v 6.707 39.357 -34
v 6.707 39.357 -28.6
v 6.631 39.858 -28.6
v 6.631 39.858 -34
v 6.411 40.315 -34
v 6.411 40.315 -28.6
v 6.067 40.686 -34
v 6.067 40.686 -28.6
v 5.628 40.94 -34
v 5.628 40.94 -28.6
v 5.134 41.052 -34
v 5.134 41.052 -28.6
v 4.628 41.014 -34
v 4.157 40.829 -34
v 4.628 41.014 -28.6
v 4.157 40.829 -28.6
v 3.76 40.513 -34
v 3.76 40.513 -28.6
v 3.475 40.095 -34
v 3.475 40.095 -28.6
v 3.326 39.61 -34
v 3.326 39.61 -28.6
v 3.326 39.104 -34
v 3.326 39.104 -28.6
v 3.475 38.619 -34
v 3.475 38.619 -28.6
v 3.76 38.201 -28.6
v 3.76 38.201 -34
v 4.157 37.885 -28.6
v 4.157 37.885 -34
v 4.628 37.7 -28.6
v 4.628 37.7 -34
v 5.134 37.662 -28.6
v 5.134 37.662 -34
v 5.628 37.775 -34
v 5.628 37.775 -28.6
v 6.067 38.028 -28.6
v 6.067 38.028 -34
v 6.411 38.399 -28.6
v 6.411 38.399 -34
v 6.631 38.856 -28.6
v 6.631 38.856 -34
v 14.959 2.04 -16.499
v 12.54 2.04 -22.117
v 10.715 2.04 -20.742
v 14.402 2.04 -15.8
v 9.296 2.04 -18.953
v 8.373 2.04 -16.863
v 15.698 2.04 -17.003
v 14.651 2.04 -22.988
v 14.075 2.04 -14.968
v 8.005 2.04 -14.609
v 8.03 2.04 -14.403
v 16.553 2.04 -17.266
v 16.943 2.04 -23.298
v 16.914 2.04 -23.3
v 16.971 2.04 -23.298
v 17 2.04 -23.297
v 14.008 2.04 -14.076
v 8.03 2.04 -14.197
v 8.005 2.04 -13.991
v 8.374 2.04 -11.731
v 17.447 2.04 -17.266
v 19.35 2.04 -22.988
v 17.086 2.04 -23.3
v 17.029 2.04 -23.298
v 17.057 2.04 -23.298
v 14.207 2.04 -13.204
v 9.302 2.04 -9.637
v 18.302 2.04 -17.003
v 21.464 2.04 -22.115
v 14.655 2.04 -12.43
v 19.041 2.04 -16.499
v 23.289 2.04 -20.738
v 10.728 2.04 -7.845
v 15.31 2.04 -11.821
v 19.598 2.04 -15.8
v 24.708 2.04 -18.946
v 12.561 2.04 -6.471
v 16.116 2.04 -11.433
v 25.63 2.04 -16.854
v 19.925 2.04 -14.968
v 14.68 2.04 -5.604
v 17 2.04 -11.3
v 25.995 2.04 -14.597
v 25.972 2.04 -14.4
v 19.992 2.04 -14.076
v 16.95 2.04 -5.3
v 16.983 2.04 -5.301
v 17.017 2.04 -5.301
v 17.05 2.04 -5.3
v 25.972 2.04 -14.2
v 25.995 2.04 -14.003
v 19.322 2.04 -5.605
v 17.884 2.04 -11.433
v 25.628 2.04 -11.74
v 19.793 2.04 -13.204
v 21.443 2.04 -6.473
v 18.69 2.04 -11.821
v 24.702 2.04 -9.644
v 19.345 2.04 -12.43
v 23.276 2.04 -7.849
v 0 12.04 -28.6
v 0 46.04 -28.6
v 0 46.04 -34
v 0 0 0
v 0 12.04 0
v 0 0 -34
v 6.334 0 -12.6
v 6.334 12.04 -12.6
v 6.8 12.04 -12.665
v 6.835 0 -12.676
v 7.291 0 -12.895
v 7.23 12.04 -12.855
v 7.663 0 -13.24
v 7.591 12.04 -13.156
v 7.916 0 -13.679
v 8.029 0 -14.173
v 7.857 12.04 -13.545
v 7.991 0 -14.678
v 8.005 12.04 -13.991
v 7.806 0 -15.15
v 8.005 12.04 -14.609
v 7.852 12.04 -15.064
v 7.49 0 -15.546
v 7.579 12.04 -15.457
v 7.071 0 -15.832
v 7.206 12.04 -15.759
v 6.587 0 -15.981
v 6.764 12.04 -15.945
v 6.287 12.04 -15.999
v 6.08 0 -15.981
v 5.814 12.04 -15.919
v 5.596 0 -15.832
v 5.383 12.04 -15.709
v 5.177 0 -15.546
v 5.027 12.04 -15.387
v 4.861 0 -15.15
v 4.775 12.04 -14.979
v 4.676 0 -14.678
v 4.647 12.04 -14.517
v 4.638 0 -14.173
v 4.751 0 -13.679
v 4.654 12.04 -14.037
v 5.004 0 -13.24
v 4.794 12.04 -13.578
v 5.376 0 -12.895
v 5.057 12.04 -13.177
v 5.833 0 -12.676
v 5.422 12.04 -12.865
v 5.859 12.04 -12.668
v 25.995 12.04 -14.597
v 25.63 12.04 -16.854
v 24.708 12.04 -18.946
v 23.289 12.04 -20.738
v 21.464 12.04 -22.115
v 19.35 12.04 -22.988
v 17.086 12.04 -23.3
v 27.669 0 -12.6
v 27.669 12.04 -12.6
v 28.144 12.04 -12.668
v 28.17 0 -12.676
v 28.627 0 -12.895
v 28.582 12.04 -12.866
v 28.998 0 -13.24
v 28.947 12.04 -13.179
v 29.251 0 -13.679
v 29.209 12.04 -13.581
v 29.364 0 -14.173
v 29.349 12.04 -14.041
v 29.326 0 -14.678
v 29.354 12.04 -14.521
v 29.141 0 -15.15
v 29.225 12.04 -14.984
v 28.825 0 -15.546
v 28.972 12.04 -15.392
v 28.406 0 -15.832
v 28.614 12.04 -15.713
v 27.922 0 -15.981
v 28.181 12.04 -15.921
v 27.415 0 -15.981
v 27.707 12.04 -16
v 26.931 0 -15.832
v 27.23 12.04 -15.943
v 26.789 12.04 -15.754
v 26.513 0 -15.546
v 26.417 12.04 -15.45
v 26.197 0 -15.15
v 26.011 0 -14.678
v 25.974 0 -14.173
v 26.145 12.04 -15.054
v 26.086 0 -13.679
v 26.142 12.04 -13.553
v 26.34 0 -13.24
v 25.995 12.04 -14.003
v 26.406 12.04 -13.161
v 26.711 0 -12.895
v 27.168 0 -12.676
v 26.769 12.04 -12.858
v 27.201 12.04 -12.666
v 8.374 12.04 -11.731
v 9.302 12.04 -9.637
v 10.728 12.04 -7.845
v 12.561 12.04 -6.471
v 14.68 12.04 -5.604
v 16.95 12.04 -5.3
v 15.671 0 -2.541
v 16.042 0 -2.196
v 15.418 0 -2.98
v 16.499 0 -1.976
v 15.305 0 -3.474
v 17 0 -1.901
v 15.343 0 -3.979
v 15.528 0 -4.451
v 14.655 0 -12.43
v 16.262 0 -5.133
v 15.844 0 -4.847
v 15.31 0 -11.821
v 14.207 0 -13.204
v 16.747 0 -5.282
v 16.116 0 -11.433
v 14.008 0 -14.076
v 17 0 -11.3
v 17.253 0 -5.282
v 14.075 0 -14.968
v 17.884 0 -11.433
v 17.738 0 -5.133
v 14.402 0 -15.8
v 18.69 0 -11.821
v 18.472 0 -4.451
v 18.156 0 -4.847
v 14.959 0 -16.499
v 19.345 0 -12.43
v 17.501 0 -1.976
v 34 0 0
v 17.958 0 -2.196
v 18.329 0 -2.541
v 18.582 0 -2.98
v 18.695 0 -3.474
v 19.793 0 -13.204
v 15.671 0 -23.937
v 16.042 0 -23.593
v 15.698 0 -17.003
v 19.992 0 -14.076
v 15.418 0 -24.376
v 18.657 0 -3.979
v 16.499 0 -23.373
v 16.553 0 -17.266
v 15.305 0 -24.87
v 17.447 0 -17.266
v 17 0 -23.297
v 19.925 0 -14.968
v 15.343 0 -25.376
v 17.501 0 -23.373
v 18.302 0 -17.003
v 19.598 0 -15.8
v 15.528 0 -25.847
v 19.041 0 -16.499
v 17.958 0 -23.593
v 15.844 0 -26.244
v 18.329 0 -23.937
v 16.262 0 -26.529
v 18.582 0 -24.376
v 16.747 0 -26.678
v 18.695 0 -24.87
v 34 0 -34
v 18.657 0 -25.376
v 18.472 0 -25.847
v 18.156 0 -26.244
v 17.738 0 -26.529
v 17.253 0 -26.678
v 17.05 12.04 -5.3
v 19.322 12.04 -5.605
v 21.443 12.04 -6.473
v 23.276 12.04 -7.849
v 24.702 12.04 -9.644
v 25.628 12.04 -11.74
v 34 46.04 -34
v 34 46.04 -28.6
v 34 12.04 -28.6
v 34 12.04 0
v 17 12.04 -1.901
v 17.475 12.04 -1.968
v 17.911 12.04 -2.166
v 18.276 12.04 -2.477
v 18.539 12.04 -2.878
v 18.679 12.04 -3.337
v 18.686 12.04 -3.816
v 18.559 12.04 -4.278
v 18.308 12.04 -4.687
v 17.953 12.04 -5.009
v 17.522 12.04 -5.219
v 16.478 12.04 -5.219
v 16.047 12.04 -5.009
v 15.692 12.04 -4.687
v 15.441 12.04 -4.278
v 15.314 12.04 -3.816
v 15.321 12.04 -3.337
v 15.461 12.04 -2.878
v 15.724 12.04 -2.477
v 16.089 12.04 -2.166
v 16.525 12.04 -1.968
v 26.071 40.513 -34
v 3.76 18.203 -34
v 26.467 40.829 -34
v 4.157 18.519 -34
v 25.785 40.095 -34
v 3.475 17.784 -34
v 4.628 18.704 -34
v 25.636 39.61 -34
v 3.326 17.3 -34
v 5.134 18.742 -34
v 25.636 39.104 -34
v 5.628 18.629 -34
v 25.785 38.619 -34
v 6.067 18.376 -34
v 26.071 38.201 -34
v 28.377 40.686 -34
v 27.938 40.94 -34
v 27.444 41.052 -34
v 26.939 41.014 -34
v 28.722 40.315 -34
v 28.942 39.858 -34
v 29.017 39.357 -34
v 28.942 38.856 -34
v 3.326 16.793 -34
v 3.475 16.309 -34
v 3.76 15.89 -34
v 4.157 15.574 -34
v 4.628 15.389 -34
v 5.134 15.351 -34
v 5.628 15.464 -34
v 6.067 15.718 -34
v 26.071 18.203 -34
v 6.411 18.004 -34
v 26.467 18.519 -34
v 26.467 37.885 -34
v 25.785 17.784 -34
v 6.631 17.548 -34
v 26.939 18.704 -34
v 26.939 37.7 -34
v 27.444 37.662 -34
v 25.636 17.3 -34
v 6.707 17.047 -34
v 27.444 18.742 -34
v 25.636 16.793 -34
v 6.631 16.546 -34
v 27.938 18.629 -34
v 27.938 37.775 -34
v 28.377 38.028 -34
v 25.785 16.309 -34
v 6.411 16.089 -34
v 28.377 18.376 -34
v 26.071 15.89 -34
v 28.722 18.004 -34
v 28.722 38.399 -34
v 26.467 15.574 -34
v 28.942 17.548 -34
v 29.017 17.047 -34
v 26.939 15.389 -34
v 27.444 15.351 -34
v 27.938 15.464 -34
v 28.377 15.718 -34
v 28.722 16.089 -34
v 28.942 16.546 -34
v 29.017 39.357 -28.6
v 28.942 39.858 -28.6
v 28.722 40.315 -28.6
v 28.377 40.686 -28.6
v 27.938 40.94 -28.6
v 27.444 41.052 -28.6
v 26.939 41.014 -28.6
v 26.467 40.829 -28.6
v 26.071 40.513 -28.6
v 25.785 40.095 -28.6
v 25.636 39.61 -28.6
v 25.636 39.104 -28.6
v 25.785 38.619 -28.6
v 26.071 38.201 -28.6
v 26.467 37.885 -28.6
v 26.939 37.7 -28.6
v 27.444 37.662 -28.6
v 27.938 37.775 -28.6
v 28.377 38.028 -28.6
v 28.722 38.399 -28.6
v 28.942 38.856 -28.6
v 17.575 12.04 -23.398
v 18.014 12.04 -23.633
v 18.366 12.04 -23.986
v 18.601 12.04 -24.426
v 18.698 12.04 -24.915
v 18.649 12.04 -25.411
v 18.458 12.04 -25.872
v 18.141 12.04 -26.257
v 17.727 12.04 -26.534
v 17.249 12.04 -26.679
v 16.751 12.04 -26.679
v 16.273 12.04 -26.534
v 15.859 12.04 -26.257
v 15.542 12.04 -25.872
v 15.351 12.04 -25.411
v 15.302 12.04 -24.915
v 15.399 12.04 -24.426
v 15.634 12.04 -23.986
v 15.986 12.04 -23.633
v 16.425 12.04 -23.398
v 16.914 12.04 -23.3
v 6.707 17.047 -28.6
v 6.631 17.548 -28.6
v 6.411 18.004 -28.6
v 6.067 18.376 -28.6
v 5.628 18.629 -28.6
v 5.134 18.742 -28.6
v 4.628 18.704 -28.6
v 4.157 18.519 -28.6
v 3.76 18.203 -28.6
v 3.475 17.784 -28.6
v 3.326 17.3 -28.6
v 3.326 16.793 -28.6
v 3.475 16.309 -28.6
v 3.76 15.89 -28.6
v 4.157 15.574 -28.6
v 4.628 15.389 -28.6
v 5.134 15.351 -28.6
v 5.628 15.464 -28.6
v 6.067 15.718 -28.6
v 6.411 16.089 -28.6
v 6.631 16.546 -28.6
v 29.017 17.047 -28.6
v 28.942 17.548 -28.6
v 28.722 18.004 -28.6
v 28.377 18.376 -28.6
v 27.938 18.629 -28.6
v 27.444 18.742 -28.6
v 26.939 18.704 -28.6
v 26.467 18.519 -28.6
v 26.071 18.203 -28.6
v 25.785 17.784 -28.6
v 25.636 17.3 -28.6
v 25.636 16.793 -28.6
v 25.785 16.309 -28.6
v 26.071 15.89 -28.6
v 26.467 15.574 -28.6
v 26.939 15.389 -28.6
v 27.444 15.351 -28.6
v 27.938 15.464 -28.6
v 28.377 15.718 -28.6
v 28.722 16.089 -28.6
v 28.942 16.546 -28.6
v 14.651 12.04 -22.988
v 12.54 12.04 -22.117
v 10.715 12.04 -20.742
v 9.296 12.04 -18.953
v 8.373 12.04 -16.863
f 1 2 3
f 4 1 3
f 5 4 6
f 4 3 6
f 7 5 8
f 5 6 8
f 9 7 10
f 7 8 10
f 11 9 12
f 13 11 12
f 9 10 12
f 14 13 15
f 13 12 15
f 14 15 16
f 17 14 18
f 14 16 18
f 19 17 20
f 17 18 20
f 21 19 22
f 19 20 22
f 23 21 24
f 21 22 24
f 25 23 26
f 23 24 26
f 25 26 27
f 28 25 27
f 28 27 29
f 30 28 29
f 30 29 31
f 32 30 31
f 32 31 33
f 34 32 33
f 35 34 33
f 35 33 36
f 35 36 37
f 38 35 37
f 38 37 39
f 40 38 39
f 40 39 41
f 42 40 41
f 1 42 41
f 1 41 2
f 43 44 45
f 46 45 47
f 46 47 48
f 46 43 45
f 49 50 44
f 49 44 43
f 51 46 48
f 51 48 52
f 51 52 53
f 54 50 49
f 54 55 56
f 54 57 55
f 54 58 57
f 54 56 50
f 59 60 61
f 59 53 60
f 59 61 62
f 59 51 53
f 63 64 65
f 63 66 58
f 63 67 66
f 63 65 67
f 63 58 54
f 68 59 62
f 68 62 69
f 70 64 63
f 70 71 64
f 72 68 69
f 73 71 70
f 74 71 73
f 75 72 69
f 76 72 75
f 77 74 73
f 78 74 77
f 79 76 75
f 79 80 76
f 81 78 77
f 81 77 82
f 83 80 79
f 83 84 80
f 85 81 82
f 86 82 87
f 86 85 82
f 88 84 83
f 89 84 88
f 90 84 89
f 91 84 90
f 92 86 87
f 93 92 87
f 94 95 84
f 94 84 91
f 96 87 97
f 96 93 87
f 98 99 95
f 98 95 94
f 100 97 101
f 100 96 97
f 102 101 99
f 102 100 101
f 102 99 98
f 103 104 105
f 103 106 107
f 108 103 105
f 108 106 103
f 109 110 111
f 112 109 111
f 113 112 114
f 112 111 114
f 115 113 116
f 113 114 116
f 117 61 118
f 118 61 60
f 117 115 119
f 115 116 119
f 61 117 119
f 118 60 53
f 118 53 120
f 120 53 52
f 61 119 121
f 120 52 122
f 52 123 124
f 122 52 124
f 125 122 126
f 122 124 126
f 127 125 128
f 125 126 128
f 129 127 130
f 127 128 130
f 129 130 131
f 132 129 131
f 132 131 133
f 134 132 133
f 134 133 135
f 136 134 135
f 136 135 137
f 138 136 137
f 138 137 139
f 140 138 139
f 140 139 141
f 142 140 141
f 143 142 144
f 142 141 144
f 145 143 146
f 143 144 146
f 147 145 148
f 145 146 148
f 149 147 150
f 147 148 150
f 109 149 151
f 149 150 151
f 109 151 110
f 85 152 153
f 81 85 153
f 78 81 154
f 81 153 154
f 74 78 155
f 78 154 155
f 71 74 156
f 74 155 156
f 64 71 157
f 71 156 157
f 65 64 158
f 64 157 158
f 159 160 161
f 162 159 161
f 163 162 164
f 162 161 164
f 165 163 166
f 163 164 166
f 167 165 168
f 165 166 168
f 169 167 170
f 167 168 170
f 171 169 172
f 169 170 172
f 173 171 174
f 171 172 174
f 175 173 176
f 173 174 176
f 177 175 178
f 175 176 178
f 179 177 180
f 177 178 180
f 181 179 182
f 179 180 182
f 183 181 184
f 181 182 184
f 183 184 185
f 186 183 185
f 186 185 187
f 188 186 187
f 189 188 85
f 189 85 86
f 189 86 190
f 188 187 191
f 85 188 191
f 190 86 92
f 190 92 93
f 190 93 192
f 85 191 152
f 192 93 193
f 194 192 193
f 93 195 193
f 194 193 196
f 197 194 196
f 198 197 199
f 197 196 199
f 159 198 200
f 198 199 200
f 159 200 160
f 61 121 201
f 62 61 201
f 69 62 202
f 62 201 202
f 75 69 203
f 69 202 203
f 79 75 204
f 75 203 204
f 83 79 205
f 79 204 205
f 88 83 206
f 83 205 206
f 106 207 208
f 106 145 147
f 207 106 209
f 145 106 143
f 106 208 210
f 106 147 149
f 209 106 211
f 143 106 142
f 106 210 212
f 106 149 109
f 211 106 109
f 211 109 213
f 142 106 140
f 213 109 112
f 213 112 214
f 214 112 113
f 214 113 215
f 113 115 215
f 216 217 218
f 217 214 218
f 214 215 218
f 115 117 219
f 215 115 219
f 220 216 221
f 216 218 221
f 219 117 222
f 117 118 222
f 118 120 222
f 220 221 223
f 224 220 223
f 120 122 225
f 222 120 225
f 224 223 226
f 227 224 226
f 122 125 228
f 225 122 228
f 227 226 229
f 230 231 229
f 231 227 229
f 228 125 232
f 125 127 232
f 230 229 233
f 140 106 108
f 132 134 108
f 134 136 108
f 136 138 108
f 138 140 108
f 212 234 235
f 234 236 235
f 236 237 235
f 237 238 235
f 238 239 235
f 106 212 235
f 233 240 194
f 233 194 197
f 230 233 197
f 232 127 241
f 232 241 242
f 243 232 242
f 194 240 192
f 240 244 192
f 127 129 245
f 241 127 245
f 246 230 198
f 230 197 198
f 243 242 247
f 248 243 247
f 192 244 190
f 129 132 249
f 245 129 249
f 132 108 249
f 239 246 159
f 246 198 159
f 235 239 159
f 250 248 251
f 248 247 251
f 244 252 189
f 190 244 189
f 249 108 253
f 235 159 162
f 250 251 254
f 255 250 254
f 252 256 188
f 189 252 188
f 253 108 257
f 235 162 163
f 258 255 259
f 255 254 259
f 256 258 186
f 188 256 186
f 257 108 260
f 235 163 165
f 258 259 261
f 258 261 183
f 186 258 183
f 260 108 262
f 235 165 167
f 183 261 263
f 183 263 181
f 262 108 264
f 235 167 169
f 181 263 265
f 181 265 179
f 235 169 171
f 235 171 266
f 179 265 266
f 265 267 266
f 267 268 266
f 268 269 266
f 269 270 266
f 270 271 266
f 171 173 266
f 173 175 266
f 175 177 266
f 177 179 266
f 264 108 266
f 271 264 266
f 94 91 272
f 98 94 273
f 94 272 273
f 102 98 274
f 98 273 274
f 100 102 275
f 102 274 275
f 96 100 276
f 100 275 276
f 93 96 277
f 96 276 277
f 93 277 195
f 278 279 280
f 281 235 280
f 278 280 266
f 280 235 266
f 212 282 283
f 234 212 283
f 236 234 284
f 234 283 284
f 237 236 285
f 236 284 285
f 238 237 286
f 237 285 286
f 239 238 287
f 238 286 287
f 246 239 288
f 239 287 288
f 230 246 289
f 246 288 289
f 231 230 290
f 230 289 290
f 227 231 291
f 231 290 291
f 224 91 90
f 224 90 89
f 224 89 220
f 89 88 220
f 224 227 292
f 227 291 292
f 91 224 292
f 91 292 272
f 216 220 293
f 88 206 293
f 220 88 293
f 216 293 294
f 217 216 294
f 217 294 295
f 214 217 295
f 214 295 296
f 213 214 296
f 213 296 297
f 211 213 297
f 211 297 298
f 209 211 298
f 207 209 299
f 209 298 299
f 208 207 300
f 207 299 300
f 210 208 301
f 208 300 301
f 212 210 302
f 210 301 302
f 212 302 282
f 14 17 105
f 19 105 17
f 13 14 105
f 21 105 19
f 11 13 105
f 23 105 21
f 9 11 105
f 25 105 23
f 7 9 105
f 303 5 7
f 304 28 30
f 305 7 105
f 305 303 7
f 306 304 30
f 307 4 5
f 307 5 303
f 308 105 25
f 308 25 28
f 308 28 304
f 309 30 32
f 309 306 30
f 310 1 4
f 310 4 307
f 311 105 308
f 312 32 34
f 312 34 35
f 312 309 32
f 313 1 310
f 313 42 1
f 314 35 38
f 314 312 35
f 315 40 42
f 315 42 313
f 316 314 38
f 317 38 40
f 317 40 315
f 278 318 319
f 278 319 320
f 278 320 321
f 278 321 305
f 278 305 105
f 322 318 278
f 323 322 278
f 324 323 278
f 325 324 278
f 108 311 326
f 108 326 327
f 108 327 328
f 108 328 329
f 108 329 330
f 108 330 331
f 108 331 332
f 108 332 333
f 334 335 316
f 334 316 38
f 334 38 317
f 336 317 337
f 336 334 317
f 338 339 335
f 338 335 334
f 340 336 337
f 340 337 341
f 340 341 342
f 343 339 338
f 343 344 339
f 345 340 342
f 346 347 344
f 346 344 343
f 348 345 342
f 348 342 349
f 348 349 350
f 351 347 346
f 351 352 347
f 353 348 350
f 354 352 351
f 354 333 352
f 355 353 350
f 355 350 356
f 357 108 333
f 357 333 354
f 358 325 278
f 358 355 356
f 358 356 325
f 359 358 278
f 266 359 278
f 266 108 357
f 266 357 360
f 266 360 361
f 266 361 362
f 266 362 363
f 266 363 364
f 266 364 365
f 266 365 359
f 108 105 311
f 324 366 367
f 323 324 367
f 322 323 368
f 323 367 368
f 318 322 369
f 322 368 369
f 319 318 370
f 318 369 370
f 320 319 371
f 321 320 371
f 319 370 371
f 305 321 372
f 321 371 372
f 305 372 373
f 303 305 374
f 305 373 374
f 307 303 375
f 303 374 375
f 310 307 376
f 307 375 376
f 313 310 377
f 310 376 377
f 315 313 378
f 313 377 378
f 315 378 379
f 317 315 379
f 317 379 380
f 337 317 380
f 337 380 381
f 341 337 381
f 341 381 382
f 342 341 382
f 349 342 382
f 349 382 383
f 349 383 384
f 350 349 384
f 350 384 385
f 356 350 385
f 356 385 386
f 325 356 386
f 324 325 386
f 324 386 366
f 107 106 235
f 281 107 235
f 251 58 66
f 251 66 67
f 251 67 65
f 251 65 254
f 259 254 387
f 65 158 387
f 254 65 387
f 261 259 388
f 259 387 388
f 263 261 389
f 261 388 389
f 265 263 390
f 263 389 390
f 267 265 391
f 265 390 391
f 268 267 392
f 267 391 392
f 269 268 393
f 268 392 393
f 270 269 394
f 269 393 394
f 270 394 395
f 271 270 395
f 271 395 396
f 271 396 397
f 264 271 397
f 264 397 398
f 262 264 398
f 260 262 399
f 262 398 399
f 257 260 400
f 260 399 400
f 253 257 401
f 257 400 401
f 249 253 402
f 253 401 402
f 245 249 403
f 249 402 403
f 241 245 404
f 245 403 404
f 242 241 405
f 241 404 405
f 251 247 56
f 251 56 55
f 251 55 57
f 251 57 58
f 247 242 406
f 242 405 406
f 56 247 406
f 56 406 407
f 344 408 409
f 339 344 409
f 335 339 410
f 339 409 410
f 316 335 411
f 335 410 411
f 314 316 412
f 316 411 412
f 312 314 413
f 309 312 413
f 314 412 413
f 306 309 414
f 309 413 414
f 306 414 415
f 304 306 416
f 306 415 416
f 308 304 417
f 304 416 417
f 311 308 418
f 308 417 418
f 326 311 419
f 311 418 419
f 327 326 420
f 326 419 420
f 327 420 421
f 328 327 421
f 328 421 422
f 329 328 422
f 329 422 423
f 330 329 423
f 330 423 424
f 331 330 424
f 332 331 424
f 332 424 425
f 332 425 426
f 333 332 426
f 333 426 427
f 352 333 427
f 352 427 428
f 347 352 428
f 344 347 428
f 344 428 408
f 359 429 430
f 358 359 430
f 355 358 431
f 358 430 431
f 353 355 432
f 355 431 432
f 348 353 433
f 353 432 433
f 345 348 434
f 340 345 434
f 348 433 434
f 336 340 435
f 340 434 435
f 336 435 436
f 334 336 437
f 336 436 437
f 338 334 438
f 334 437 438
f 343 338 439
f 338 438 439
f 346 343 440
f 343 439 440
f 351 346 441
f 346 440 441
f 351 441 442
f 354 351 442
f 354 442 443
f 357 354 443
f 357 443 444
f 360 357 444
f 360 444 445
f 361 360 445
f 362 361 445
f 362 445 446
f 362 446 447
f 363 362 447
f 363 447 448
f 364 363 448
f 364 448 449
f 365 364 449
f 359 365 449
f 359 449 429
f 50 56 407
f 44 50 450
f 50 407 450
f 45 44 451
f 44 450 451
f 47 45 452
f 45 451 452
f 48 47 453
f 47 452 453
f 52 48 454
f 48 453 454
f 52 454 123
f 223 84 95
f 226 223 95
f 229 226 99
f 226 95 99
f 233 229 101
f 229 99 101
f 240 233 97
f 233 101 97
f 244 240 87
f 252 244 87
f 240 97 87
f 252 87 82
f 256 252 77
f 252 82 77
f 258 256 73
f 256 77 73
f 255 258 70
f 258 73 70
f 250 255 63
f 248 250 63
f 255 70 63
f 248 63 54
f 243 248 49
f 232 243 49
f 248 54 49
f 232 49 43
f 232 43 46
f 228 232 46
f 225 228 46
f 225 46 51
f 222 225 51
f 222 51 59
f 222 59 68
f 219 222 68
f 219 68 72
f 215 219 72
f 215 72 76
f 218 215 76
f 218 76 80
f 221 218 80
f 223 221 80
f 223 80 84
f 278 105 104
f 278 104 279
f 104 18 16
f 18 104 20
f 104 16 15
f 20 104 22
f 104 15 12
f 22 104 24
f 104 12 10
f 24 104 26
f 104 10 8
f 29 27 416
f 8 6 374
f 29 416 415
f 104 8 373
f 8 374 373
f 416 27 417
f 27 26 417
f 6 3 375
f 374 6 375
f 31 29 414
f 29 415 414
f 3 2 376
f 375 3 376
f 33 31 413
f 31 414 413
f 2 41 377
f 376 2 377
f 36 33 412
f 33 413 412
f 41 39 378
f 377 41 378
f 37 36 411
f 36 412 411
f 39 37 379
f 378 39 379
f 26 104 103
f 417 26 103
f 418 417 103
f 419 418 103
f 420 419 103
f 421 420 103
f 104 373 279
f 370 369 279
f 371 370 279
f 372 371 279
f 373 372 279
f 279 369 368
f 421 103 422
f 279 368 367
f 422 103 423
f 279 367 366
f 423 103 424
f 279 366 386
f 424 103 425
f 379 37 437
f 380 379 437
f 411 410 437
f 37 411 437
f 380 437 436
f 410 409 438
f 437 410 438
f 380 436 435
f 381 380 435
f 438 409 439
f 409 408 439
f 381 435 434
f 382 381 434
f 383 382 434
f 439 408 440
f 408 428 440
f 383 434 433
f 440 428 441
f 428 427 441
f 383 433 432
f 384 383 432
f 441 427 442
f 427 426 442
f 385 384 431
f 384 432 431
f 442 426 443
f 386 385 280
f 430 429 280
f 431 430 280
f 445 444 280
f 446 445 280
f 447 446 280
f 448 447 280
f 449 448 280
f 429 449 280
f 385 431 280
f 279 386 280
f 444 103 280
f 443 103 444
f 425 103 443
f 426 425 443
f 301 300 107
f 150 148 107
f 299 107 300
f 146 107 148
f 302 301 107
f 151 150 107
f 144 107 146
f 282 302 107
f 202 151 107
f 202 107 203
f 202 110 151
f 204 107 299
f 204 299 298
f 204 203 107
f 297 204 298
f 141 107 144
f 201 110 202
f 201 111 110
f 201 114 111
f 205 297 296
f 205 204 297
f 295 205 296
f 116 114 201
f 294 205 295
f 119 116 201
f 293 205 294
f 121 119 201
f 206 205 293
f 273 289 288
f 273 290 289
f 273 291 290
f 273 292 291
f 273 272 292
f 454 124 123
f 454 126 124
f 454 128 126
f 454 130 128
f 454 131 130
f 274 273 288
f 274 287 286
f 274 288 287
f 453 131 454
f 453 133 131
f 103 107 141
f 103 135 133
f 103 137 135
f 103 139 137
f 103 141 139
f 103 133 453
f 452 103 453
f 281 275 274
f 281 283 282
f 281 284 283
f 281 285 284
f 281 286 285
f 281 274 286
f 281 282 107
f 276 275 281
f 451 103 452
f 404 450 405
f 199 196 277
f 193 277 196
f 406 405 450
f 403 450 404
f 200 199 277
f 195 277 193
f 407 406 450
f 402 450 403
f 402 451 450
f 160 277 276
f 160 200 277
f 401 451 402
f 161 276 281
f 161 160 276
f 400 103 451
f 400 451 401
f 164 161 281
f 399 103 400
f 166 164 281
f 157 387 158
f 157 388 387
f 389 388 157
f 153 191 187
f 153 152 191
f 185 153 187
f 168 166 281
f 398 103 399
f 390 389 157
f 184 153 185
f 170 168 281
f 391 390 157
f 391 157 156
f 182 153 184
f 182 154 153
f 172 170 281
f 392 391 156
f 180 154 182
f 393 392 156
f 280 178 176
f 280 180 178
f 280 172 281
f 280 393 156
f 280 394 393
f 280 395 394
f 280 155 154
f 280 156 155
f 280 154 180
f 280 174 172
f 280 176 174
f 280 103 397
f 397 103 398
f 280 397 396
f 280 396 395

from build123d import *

# Parameters (mm, degrees)
SKETCH1_W           = 34
SKETCH1_H           = 34
BOSS_EXTRUDE1_DEPTH = 12.04
SKETCH2_W           = 34
SKETCH2_H           = 5.4
BOSS_EXTRUDE2_DEPTH = 34
SKETCH3_R           = 9
CUT_EXTRUDE1_DEPTH  = 10
SKETCH4_R           = 1.7
SKETCH4_R_2         = 1.700000029
CUT_EXTRUDE2_DEPTH  = 59.889727457
SKETCH6_R           = 3
CUT_EXTRUDE3_DEPTH  = 66.176682947
SKETCH7_R           = 1.7
CUT_EXTRUDE4_DEPTH  = 64.981572347


with BuildPart() as part:
    # Sketch1 → Boss-Extrude1 (new body)
    with BuildSketch(Plane(origin=(0, 0, 0), x_dir=(1, 0, 0), z_dir=(0, 1, 0))):
        with Locations((17, 17)):
            Rectangle(SKETCH1_W, SKETCH1_H)
    extrude(amount=BOSS_EXTRUDE1_DEPTH)

    # Sketch2 → Boss-Extrude2 (add)
    with BuildSketch(Plane(origin=(0, 12.04, 0), x_dir=(1, 0, 0), z_dir=(0, 1, 0))):
        with Locations((17, 31.3)):
            Rectangle(SKETCH2_W, SKETCH2_H)
    extrude(amount=BOSS_EXTRUDE2_DEPTH)

    # Sketch3 → Cut-Extrude1 (cut)
    with BuildSketch(Plane(origin=(0, 12.04, 0), x_dir=(1, 0, 0), z_dir=(0, 1, 0))):
        with Locations(Location((17, 14.3, 0), (0, 0, 270))):
            Circle(SKETCH3_R)
    extrude(amount=-CUT_EXTRUDE1_DEPTH, mode=Mode.SUBTRACT)

    # Sketch4 → Cut-Extrude2 (cut, through all)
    with BuildSketch(Plane(origin=(0, 12.04, 0), x_dir=(1, 0, 0), z_dir=(0, 1, 0))):
        with Locations(Location((6.33358771, 14.3, 0), (0, 0, 270))):
            Circle(SKETCH4_R)
        with Locations(Location((27.668868507, 14.3, 0), (0, 0, 270))):
            Circle(SKETCH4_R_2)
        with Locations(Location((17, 3.600864666, 0), (0, 0, 270))):
            Circle(SKETCH4_R)
        with Locations(Location((17, 24.997428292, 0), (0, 0, 270))):
            Circle(SKETCH4_R)
    extrude(amount=-CUT_EXTRUDE2_DEPTH, mode=Mode.SUBTRACT)

    # Sketch6 → Cut-Extrude3 (cut, through all)
    with BuildSketch(Plane(origin=(0, 2.04, 0), x_dir=(1, 0, 0), z_dir=(0, 1, 0))):
        with Locations(Location((17, 14.3, 0), (0, 0, 270))):
            Circle(SKETCH6_R)
    extrude(amount=-CUT_EXTRUDE3_DEPTH, mode=Mode.SUBTRACT)

    # Sketch7 → Cut-Extrude4 (cut, through all)
    with BuildSketch(Plane.XY.offset(-28.6)):
        with Locations((5.006682724, 39.357086706)):
            Circle(SKETCH7_R)
        with Locations((27.317086706, 39.357086706)):
            Circle(SKETCH7_R)
        with Locations((5.006682724, 17.046682724)):
            Circle(SKETCH7_R)
        with Locations((27.317086706, 17.046682724)):
            Circle(SKETCH7_R)
    extrude(amount=-CUT_EXTRUDE4_DEPTH, mode=Mode.SUBTRACT)


solid = part.part
